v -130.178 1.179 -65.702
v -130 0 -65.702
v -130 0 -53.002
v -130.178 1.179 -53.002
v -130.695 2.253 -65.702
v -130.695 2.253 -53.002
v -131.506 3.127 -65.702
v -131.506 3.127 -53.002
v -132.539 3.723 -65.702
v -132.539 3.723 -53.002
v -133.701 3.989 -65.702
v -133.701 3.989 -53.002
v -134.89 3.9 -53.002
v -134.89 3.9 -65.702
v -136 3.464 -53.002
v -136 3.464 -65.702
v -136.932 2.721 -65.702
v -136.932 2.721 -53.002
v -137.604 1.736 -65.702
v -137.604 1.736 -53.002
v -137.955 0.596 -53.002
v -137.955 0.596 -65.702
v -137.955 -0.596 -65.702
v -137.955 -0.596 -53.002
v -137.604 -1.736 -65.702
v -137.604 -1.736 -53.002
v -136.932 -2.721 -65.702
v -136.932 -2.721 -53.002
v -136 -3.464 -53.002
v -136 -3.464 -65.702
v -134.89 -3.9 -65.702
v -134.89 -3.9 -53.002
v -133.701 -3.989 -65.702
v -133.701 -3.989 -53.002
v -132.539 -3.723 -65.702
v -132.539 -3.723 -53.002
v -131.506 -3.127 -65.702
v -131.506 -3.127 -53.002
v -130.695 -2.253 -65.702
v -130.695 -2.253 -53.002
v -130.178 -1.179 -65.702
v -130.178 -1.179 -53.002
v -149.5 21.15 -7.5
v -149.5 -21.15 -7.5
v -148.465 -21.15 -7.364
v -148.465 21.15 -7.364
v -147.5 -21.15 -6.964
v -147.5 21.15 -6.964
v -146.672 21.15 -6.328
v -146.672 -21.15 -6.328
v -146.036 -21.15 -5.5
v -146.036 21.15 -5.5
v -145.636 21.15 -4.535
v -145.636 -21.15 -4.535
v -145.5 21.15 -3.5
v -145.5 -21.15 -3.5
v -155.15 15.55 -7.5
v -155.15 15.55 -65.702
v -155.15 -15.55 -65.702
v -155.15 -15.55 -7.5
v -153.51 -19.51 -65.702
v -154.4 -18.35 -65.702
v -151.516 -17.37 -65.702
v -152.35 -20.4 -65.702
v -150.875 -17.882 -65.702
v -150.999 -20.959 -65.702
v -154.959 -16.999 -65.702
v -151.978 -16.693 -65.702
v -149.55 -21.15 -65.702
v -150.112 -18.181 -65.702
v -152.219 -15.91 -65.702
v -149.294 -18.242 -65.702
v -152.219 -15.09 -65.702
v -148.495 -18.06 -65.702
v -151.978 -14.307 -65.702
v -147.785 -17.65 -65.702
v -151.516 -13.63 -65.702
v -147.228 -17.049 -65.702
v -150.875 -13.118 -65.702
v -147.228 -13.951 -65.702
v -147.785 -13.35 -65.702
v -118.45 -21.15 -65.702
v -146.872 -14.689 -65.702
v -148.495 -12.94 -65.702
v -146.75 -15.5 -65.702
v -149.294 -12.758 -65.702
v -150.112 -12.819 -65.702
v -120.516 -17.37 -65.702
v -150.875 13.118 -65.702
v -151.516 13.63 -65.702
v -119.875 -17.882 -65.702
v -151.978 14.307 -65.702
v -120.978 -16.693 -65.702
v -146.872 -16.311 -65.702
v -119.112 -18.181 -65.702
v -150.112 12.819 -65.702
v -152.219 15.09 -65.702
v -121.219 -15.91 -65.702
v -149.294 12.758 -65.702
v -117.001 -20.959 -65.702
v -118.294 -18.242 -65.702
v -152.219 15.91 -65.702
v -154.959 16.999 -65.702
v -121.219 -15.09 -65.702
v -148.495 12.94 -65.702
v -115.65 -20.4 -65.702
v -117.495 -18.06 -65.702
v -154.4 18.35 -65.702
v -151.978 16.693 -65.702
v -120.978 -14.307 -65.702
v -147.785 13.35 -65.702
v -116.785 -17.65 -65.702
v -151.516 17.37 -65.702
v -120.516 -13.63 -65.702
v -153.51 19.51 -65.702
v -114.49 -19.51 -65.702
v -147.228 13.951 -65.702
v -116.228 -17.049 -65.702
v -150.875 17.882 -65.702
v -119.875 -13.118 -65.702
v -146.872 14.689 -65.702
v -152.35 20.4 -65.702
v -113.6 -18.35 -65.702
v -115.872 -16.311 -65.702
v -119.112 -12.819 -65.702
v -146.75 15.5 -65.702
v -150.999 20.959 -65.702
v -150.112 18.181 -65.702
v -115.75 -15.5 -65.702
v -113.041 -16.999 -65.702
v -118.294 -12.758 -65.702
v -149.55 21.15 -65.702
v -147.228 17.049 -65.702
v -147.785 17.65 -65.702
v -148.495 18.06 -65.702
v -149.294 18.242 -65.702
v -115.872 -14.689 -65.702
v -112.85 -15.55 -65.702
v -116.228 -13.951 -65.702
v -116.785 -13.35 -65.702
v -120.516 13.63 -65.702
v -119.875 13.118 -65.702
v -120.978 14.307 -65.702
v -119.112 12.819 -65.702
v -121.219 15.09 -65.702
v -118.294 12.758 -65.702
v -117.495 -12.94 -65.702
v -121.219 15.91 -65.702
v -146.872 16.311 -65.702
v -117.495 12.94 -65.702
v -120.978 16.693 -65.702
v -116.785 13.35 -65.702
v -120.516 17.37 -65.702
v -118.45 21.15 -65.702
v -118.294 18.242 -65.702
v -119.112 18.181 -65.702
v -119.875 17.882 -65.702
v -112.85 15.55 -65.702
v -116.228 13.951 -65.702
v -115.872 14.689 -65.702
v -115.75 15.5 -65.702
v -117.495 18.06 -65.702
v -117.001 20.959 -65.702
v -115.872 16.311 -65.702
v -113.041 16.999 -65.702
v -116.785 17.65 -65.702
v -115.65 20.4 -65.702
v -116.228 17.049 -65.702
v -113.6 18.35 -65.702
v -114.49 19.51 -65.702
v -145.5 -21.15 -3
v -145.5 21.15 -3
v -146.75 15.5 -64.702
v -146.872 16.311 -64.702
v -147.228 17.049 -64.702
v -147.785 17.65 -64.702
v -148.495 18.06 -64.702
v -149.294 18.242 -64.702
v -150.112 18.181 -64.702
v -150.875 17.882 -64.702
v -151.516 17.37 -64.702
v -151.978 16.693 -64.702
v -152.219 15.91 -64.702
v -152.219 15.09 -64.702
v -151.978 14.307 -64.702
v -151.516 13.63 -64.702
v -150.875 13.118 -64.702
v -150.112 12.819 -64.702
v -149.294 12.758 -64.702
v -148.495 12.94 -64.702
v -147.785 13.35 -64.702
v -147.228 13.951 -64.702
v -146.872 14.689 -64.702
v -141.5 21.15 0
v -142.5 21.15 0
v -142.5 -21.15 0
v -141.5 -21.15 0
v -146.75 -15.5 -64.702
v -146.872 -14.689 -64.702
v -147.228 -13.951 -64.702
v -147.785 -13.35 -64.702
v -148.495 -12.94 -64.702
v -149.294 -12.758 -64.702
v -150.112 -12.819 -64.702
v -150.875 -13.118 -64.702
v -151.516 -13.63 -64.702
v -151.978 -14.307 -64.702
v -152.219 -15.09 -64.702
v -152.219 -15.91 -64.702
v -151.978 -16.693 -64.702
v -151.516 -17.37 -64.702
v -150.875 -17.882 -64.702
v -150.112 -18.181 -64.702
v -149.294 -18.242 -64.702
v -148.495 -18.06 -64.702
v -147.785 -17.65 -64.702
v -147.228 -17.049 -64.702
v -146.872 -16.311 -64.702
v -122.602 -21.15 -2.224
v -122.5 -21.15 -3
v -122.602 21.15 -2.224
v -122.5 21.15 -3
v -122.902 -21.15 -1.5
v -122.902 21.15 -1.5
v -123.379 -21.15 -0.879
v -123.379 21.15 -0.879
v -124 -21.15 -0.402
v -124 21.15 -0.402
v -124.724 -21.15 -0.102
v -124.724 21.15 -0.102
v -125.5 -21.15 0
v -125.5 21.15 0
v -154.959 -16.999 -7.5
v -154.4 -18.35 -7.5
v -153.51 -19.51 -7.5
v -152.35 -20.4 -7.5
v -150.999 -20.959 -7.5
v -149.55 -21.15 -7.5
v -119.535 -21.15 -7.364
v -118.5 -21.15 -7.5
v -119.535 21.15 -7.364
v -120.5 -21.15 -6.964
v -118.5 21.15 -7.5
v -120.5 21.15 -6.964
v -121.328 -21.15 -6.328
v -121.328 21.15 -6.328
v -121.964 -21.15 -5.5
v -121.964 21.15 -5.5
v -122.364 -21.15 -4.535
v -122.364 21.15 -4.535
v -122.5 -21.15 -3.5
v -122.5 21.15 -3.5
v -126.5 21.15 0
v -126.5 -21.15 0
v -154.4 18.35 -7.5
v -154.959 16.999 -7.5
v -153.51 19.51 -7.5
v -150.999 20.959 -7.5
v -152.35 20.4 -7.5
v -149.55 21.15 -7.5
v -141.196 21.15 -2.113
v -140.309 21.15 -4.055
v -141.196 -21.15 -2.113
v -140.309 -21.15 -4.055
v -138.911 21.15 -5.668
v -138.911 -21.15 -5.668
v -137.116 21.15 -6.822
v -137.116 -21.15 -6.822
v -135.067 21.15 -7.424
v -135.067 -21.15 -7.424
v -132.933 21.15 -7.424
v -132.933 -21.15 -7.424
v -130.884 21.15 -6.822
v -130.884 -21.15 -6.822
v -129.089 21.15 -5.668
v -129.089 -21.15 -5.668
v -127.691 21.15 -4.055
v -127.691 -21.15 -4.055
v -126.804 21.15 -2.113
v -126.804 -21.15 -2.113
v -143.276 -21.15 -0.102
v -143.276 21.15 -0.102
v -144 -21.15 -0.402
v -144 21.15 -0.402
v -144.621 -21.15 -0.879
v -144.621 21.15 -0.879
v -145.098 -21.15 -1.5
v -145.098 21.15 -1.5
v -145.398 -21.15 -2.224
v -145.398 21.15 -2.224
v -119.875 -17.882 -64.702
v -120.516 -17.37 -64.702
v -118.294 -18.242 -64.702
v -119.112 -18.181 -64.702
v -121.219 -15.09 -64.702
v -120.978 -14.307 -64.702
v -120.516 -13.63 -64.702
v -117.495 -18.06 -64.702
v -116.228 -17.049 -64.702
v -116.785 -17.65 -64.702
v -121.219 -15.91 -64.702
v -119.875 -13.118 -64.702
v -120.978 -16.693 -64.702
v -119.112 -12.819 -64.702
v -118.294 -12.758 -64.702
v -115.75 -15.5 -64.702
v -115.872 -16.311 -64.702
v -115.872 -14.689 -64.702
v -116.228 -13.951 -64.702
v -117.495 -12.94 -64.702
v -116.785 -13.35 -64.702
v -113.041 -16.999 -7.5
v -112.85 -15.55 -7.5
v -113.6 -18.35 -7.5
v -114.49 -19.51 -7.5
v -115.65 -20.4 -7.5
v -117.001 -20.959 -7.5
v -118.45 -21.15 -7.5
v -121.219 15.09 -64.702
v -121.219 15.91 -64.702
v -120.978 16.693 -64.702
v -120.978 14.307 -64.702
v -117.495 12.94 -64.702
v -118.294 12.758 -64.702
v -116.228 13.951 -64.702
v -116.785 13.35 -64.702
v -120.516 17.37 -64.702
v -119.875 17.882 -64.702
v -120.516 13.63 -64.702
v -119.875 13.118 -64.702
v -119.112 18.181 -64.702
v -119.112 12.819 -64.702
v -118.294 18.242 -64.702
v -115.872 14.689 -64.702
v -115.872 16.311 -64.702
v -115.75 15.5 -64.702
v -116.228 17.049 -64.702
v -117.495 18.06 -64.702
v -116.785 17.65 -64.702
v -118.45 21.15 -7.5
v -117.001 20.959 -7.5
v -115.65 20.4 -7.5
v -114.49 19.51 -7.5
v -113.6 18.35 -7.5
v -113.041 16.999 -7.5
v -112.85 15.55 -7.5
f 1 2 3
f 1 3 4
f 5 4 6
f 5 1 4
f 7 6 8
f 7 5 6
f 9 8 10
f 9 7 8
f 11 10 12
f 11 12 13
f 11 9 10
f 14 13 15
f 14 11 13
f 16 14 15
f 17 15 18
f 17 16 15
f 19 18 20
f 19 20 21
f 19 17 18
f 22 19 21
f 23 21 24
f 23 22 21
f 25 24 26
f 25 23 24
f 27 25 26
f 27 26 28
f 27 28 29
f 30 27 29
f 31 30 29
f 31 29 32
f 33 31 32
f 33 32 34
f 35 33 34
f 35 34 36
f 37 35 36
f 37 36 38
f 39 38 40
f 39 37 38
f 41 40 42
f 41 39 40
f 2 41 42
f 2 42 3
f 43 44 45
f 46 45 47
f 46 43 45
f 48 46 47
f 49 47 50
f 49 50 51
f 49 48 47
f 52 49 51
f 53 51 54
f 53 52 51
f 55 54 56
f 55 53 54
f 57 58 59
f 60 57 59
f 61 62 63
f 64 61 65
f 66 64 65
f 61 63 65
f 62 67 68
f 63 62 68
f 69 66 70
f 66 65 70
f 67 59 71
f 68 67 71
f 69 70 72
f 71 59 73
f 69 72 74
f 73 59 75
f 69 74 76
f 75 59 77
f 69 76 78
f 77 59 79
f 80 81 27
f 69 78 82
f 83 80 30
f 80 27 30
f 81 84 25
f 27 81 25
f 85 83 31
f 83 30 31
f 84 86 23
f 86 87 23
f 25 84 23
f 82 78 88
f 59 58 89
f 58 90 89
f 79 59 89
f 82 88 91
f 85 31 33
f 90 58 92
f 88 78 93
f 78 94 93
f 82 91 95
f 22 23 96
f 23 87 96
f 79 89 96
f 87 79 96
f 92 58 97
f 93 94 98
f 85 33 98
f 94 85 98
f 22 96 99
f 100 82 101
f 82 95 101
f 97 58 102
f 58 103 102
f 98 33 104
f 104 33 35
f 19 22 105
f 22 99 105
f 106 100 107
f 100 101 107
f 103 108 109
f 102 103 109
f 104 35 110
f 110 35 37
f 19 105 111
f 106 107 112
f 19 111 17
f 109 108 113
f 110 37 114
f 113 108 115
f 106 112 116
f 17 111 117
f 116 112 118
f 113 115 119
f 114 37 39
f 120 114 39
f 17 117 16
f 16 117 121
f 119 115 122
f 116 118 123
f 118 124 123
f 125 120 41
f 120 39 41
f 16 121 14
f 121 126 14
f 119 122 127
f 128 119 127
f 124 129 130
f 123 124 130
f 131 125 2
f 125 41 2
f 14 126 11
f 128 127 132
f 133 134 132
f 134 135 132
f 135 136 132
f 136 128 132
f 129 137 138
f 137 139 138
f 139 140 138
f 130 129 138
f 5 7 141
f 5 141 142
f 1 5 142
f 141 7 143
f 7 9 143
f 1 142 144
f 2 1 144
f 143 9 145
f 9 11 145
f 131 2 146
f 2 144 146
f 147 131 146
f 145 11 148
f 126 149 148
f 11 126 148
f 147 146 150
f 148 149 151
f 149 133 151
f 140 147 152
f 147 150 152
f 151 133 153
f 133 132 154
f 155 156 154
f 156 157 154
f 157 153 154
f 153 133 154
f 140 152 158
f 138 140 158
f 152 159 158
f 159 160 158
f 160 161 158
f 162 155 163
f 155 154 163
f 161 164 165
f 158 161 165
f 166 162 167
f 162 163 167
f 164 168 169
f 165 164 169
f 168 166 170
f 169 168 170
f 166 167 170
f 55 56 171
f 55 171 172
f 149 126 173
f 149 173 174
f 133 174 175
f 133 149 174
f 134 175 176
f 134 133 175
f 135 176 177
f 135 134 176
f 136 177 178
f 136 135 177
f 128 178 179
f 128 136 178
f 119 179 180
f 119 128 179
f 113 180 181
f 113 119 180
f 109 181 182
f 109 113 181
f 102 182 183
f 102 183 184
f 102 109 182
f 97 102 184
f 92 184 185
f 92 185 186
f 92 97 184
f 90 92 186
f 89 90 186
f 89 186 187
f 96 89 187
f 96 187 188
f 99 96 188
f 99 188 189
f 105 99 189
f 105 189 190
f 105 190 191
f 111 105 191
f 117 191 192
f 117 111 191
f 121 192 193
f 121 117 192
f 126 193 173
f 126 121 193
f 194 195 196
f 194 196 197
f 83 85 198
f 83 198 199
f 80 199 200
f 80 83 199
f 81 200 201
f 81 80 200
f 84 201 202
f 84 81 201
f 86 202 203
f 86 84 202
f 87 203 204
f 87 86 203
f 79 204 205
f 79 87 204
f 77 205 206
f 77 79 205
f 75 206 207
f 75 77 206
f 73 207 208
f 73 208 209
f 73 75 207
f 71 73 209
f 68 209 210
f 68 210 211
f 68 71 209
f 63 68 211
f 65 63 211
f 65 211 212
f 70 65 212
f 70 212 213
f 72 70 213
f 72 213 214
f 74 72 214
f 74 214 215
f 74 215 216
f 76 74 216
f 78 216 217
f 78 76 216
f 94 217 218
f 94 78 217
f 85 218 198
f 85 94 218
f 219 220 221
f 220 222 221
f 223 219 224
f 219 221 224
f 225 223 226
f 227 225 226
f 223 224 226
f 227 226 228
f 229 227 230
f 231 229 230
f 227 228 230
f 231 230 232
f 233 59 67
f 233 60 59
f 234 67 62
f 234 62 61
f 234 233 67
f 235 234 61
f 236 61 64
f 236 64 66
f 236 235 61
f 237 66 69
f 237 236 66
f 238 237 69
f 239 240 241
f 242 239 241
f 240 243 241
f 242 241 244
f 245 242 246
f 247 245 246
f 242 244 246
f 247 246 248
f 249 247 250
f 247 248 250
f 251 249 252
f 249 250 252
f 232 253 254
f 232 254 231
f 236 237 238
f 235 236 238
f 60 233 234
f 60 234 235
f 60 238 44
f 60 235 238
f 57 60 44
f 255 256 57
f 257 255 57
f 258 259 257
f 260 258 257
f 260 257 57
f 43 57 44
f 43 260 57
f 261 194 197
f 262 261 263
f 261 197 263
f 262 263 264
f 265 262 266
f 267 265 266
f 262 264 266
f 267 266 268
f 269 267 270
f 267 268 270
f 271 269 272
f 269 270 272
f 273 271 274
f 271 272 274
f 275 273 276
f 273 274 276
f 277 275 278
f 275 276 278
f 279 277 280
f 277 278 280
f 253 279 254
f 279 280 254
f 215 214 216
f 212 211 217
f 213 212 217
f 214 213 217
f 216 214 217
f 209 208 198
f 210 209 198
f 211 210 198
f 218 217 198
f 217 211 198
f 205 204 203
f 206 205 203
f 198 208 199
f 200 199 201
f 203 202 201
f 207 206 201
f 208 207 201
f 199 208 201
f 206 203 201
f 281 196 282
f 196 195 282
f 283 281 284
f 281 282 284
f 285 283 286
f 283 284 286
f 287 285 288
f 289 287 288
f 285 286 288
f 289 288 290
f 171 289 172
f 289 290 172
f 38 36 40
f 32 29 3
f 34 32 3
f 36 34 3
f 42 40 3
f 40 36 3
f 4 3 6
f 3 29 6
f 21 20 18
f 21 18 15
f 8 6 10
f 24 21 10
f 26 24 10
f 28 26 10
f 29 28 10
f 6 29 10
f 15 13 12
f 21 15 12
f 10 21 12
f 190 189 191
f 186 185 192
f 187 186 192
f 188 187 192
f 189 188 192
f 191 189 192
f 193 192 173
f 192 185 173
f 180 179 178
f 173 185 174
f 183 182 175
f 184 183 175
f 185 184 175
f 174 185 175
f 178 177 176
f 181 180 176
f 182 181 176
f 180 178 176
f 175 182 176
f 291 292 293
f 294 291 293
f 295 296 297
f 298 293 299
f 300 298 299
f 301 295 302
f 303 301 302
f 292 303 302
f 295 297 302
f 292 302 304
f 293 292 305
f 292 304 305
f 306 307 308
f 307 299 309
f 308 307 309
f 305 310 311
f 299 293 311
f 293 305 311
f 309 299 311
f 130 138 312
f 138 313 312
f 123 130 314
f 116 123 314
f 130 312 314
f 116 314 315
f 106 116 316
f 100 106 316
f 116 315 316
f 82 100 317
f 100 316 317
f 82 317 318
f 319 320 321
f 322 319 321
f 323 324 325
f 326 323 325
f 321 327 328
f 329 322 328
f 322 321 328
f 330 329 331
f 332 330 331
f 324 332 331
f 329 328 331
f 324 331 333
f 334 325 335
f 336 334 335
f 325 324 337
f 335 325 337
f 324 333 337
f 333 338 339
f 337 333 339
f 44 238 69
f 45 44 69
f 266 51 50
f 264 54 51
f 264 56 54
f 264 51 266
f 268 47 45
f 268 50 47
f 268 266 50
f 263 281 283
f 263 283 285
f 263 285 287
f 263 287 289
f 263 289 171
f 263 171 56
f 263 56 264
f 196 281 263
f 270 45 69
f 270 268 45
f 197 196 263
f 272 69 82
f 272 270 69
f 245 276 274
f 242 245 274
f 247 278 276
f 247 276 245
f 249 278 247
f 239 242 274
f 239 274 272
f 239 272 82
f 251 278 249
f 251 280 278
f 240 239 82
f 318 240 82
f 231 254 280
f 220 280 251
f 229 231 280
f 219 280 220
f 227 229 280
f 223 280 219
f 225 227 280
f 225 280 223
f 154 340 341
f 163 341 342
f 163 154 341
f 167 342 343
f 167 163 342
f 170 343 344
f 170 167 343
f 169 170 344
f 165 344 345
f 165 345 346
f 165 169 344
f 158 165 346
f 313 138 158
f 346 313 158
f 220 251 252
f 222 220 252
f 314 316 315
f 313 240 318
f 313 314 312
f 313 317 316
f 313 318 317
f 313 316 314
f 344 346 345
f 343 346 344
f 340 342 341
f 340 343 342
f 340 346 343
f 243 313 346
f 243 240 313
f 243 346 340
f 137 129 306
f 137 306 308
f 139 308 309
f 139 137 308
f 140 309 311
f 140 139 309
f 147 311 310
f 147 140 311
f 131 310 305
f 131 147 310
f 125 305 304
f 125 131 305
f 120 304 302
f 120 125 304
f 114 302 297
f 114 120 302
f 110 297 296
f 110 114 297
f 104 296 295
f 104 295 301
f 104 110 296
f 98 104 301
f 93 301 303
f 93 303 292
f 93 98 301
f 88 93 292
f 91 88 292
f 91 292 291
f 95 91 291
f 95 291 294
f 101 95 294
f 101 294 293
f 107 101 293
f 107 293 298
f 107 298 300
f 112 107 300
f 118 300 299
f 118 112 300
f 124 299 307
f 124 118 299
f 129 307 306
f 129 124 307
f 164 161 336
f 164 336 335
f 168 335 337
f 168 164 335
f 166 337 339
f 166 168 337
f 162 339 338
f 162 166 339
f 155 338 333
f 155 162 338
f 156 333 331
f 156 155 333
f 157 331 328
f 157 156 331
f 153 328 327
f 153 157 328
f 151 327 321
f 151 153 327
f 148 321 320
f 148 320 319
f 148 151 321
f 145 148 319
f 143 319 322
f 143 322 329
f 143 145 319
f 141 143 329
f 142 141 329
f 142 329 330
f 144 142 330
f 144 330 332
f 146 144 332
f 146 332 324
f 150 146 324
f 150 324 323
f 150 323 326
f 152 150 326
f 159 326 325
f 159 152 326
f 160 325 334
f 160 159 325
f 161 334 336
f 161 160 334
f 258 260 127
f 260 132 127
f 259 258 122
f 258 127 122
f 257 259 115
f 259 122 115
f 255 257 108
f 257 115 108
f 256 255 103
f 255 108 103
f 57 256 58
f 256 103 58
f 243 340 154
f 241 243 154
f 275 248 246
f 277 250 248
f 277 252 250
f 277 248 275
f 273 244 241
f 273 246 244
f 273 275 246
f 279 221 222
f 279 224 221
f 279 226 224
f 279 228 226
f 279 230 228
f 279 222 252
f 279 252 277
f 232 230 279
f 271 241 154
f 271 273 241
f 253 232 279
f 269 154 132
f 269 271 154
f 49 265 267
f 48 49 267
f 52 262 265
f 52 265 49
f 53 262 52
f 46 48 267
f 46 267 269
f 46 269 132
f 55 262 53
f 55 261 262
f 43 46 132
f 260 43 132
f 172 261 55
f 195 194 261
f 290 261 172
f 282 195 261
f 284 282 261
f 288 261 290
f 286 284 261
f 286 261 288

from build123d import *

# Parameters (mm, degrees)
SKETCH047_W     = 42.3
SKETCH047_H     = 42.3
SKETCH047_R     = 4
PAD021_DEPTH    = 12.7
SKETCH053_W     = 42.3
SKETCH053_H     = 42.3
SKETCH054_W     = 42.3
SKETCH054_H     = 42.3
SKETCH055_W     = 23
SKETCH055_H     = 42.3
PAD022_DEPTH    = 7.5
SKETCH056_R     = 7.5
POCKET008_DEPTH = 50
SKETCH048_R     = 2.75
POCKET009_DEPTH = 1
FILLET007_R     = 4
FILLET008_R     = 3
FILLET009_R     = 5.6


with BuildPart() as part:
    # Sketch047 (on Face1 of Binder017) → Pad021 (new body)
    with BuildSketch(Plane.XY.offset(-65.702215)):
        with Locations((-134, 0)):
            Rectangle(SKETCH047_W, SKETCH047_H)
        with Locations((-134, 0)):
            Circle(SKETCH047_R, mode=Mode.SUBTRACT)
    extrude(amount=PAD021_DEPTH)

    # Sketch053 → AdditiveLoft004 section 0
    with BuildSketch(Plane.XY.offset(-53.002215)):
        with Locations((-134, 0)):
            Rectangle(SKETCH053_W, SKETCH053_H)
    # Sketch054 (on DatumPlane) → AdditiveLoft004 section 1
    with BuildSketch(Plane.XY.offset(-7.5)):
        with Locations((-134, 0)):
            Rectangle(SKETCH054_W, SKETCH054_H)
    loft()

    # Sketch055 (on Face10 of AdditiveLoft004) → Pad022 (join)
    with BuildSketch(Plane.XY.offset(-7.5)):
        with Locations((-134, 0)):
            Rectangle(SKETCH055_W, SKETCH055_H)
    extrude(amount=PAD022_DEPTH)

    # Sketch056 (on Face18 of Pad022) → Pocket008 (cut)
    with BuildSketch(Plane.XZ.offset(21.15)):
        with Locations((-134, 0)):
            Circle(SKETCH056_R)
    extrude(amount=-POCKET008_DEPTH, mode=Mode.SUBTRACT)

    # Sketch048 (on Face1 of Binder017) → Pocket009 (cut)
    with BuildSketch(Plane.XY.offset(-65.702215)):
        with Locations((-149.5, -15.5)):
            Circle(SKETCH048_R)
        with Locations((-118.5, -15.5)):
            Circle(SKETCH048_R)
        with Locations((-118.5, 15.5)):
            Circle(SKETCH048_R)
        with Locations((-149.5, 15.5)):
            Circle(SKETCH048_R)
    extrude(amount=POCKET009_DEPTH, mode=Mode.SUBTRACT)

    # Fillet007
    fillet007_edges = [part.edges().sort_by_distance(p)[0] for p in [
        (-122.5, 0, -7.5),
        (-145.5, 0, -7.5),
    ]]
    fillet(fillet007_edges, radius=FILLET007_R)

    # Fillet008
    fillet008_edges = [part.edges().sort_by_distance(p)[0] for p in [
        (-122.5, 0, 0),
        (-145.5, 0, 0),
    ]]
    fillet(fillet008_edges, radius=FILLET008_R)

    # Fillet009
    fillet009_edges = [part.edges().sort_by_distance(p)[0] for p in [
        (-155.15, -21.15, -30.251107),
        (-155.15, -21.15, -59.352215),
        (-155.15, 21.15, -30.251107),
        (-155.15, 21.15, -59.352215),
        (-112.85, -21.15, -30.251107),
        (-112.85, -21.15, -59.352215),
        (-112.85, 21.15, -59.352215),
        (-112.85, 21.15, -30.251107),
    ]]
    fillet(fillet009_edges, radius=FILLET009_R)


solid = part.part
